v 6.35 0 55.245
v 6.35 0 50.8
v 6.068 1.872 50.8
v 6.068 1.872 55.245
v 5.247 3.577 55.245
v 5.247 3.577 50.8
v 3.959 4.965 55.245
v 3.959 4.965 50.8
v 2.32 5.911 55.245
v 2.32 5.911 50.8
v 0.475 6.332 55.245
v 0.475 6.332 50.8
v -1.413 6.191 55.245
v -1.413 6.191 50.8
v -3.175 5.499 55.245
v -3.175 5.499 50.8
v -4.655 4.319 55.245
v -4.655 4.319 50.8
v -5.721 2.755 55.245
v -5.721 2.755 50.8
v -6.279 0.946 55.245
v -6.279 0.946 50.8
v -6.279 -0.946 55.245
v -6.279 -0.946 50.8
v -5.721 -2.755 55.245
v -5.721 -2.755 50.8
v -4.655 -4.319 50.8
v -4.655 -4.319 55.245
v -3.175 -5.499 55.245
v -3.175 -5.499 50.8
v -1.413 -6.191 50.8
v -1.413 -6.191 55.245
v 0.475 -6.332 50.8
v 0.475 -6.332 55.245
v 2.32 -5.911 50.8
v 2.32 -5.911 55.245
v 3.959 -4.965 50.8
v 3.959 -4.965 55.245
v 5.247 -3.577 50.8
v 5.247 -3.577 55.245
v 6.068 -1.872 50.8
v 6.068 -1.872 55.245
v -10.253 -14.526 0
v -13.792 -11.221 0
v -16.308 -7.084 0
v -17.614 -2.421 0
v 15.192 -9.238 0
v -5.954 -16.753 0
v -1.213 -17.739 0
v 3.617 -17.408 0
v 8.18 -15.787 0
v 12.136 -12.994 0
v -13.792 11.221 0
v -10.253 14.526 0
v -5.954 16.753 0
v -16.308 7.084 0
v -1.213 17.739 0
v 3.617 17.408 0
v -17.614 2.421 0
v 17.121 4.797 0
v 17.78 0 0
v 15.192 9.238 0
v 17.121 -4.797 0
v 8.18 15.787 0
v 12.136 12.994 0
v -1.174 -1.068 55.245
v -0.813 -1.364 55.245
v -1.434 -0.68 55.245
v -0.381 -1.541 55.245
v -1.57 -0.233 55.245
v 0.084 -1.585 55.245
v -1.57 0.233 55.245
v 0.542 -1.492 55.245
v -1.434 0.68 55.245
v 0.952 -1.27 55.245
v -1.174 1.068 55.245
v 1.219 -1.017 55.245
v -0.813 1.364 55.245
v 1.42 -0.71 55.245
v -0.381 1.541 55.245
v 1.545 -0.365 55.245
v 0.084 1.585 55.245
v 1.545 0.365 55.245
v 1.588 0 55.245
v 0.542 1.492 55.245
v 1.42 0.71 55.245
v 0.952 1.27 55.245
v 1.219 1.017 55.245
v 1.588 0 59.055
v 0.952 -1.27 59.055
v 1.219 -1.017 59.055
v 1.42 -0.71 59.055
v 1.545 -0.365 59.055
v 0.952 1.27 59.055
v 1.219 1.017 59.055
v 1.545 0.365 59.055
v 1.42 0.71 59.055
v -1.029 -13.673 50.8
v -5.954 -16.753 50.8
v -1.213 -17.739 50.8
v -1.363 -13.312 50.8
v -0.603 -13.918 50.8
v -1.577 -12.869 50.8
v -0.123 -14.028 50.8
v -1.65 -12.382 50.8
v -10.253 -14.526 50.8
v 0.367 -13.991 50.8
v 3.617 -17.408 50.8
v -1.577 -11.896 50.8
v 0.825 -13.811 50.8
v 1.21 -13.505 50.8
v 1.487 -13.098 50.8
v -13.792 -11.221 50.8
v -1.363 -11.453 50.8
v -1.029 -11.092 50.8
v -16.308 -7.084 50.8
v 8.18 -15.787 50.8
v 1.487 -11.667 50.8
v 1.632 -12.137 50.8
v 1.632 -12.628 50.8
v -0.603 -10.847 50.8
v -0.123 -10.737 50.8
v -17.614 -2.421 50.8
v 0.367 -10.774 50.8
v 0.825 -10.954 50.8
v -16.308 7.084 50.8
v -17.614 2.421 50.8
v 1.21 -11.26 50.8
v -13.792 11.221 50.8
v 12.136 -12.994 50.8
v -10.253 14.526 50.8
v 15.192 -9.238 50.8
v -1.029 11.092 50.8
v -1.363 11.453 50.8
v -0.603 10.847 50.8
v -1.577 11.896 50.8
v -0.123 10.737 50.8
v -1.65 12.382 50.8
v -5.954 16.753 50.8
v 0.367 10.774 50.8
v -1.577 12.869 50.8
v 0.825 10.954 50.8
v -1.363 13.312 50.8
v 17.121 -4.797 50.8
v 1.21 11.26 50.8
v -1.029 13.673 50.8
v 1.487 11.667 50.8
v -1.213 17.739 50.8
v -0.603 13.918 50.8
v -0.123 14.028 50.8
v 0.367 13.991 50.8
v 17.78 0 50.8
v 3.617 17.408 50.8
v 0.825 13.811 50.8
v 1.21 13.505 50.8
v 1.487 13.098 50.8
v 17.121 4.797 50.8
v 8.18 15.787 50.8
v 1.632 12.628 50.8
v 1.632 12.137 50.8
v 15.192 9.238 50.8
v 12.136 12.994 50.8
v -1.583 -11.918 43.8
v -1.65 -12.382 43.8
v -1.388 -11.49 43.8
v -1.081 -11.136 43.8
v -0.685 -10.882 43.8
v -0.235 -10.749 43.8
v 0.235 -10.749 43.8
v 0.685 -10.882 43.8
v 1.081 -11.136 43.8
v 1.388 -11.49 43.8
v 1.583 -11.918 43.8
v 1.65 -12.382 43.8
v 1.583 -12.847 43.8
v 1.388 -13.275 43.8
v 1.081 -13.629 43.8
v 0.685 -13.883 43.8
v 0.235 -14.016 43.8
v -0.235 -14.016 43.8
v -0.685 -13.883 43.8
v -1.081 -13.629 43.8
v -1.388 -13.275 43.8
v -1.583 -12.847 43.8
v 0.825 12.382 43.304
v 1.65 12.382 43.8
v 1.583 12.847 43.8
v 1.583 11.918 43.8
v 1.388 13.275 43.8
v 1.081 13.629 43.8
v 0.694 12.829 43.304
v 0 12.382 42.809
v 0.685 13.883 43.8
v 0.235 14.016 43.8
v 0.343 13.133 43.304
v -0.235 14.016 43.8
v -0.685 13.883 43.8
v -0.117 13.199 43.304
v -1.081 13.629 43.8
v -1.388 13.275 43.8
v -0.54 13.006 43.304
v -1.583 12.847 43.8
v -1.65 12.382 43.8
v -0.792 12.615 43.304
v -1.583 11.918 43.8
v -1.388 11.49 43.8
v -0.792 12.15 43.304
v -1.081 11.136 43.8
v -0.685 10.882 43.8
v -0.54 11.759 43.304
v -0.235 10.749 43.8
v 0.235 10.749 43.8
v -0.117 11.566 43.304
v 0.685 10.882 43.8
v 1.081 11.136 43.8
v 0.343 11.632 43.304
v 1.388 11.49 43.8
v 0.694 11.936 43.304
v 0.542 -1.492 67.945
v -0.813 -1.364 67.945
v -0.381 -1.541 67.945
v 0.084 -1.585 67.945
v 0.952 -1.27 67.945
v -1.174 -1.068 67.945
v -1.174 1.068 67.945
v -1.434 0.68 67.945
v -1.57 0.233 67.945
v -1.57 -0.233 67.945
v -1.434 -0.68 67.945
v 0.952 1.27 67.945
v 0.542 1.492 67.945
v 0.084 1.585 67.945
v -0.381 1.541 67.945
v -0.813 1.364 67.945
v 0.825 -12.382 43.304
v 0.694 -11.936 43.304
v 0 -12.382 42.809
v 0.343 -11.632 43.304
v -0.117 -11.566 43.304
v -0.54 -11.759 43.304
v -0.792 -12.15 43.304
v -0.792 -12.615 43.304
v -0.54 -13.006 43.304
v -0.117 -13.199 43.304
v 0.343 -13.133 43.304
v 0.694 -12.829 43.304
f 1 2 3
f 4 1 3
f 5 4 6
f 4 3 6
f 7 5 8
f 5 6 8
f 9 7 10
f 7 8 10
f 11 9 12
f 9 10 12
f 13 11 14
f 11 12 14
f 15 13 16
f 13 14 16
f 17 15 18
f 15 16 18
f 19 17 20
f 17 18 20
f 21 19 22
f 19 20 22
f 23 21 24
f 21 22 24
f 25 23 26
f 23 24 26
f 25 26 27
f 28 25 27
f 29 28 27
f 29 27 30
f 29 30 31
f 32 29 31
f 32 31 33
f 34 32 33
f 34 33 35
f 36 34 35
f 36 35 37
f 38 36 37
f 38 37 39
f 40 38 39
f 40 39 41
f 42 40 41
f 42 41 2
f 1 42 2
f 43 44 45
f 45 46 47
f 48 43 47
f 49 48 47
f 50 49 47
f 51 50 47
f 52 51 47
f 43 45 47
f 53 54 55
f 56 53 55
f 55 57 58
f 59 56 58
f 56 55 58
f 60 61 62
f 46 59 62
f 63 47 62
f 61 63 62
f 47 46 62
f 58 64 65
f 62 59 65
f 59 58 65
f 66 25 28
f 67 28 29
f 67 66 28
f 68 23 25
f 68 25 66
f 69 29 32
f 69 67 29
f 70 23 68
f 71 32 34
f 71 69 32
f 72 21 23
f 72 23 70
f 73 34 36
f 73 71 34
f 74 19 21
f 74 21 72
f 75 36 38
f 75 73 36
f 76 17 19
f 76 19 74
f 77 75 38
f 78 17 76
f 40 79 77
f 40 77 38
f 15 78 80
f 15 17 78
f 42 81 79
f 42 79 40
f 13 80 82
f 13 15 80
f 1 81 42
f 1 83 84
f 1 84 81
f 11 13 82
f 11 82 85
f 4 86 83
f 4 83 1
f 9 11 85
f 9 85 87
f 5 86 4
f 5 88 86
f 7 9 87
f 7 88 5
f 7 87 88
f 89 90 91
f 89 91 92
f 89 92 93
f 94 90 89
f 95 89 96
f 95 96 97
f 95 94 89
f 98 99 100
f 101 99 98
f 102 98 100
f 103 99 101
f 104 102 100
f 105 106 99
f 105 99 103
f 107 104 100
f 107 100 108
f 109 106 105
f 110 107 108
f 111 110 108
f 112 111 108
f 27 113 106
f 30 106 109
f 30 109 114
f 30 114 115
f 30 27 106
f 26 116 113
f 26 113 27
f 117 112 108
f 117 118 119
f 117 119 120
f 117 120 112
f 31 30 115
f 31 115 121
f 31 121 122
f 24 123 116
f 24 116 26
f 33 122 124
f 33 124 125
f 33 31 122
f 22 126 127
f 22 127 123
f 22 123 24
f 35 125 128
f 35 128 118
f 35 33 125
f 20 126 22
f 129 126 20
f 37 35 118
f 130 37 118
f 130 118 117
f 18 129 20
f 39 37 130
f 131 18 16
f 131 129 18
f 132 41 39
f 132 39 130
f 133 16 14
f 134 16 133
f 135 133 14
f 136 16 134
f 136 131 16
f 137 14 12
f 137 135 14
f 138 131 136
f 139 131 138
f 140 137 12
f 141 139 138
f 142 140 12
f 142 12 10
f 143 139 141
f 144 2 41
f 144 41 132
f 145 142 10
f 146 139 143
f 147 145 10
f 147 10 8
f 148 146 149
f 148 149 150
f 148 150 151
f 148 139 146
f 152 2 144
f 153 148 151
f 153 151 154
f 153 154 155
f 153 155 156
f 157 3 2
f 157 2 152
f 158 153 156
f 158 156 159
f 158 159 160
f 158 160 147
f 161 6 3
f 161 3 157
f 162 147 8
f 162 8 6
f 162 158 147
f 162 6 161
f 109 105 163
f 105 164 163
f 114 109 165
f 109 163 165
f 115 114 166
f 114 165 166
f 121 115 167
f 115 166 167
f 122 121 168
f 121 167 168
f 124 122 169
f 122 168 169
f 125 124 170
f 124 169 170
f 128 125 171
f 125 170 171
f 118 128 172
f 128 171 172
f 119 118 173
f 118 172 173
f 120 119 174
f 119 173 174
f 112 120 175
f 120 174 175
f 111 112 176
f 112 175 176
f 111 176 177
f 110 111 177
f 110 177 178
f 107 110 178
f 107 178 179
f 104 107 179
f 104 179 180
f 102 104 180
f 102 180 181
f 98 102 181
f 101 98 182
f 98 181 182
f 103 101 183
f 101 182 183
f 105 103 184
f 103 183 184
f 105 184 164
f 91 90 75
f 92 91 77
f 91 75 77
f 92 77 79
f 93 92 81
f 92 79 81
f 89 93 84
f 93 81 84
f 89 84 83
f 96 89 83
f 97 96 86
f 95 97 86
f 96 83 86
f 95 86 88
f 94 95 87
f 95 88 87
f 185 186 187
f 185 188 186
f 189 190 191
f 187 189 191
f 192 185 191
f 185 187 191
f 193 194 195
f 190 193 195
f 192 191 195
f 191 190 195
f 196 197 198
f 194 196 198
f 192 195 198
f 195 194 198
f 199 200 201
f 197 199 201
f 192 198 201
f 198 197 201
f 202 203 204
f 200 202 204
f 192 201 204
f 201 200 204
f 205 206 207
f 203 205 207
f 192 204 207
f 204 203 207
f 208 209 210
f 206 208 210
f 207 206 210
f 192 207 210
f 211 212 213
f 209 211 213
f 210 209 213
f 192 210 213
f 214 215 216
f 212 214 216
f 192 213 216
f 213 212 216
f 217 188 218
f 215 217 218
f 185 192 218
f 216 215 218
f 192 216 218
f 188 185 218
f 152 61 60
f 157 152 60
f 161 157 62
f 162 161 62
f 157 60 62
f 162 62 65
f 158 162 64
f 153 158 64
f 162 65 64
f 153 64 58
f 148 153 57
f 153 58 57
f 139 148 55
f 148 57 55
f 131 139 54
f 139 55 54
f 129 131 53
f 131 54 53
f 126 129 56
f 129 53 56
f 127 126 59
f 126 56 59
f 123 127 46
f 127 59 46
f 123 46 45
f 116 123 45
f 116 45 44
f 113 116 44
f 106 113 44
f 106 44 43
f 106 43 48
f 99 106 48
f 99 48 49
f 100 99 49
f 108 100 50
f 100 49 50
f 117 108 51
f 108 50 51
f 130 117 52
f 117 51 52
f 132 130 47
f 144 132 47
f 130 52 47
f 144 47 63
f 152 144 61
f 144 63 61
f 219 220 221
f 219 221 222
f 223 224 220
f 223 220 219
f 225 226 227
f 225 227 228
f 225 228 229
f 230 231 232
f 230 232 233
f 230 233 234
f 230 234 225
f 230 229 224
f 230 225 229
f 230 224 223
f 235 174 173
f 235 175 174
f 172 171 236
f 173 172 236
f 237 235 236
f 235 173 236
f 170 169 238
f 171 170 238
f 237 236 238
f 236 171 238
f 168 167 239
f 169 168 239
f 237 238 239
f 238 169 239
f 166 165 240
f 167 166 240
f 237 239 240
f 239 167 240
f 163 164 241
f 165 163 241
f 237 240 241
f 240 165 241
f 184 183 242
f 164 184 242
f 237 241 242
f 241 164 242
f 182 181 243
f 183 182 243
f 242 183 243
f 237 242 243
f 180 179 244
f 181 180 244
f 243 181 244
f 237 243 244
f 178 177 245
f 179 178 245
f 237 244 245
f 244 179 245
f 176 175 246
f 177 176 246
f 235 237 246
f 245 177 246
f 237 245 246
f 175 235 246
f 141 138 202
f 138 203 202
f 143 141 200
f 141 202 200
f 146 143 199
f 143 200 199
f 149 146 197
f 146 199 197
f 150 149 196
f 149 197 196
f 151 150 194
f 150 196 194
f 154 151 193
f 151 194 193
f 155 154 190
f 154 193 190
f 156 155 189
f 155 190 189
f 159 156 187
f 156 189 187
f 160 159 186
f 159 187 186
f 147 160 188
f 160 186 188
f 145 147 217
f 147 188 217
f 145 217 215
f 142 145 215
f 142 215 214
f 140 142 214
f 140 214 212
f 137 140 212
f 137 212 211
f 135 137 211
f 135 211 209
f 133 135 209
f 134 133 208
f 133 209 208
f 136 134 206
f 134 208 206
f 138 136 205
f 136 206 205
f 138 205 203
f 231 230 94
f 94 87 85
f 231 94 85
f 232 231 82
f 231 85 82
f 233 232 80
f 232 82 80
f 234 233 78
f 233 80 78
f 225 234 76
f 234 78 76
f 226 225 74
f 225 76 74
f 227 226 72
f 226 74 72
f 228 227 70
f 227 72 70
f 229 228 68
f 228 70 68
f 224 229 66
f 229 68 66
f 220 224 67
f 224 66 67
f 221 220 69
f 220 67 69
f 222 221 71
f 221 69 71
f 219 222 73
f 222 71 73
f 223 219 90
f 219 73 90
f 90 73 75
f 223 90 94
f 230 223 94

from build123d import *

# Parameters (mm, degrees)
F0_R     = 17.78
F0_R_2   = 6.35
F1_DEPTH = 50.8
F2_DEPTH = 55.245
F3_DEPTH = 67.945
F4_DEPTH = 59.055
F6_D     = 3.3
F6_DEPTH = 7
F6_TIP   = 0.9914200214


with BuildPart() as f1:
    # F0 (on Top) → F1 (new body)
    with BuildSketch(Plane.XY):
        Circle(F0_R)
        Circle(F0_R_2, mode=Mode.SUBTRACT)
    extrude(amount=F1_DEPTH)

    # F0 (on Top) → F2 (join)
    with BuildSketch(Plane.XY):
        Circle(F0_R_2)
        with BuildLine():
            ThreePointArc((0.9525, 1.27), (1.4199031657, 0.7099515829), (1.5875, 0))
            ThreePointArc((1.5875, 0), (1.4199031657, -0.7099515829), (0.9525, -1.27))
            ThreePointArc((0.9525, -1.27), (-1.5875, 0), (0.9525, 1.27))
        make_face(mode=Mode.SUBTRACT)
    extrude(amount=F2_DEPTH)

    # F0 (on Top) → F3 (join)
    with BuildSketch(Plane.XY):
        with BuildLine():
            Line((0.9525, -1.27), (0.9525, 1.27))
            ThreePointArc((0.9525, 1.27), (-1.5875, 0), (0.9525, -1.27))
        make_face()
    extrude(amount=F3_DEPTH)

    # F0 (on Top) → F4 (join)
    with BuildSketch(Plane.XY):
        with BuildLine():
            ThreePointArc((0.9525, -1.27), (1.4199031657, -0.7099515829), (1.5875, 0))
            ThreePointArc((1.5875, 0), (1.4199031657, 0.7099515829), (0.9525, 1.27))
            Line((0.9525, 1.27), (0.9525, -1.27))
        make_face()
    extrude(amount=F4_DEPTH)

    # F6
    with Locations(Plane.XY.offset(50.8)):
        with Locations((0, 12.3825), (0, -12.3825)):
            Hole(F6_D / 2, depth=F6_DEPTH)
            with Locations((0, 0, -(F6_DEPTH + F6_TIP / 2))):  # 118° drill point
                Cone(0, F6_D / 2, F6_TIP, mode=Mode.SUBTRACT)


solid = f1.part
